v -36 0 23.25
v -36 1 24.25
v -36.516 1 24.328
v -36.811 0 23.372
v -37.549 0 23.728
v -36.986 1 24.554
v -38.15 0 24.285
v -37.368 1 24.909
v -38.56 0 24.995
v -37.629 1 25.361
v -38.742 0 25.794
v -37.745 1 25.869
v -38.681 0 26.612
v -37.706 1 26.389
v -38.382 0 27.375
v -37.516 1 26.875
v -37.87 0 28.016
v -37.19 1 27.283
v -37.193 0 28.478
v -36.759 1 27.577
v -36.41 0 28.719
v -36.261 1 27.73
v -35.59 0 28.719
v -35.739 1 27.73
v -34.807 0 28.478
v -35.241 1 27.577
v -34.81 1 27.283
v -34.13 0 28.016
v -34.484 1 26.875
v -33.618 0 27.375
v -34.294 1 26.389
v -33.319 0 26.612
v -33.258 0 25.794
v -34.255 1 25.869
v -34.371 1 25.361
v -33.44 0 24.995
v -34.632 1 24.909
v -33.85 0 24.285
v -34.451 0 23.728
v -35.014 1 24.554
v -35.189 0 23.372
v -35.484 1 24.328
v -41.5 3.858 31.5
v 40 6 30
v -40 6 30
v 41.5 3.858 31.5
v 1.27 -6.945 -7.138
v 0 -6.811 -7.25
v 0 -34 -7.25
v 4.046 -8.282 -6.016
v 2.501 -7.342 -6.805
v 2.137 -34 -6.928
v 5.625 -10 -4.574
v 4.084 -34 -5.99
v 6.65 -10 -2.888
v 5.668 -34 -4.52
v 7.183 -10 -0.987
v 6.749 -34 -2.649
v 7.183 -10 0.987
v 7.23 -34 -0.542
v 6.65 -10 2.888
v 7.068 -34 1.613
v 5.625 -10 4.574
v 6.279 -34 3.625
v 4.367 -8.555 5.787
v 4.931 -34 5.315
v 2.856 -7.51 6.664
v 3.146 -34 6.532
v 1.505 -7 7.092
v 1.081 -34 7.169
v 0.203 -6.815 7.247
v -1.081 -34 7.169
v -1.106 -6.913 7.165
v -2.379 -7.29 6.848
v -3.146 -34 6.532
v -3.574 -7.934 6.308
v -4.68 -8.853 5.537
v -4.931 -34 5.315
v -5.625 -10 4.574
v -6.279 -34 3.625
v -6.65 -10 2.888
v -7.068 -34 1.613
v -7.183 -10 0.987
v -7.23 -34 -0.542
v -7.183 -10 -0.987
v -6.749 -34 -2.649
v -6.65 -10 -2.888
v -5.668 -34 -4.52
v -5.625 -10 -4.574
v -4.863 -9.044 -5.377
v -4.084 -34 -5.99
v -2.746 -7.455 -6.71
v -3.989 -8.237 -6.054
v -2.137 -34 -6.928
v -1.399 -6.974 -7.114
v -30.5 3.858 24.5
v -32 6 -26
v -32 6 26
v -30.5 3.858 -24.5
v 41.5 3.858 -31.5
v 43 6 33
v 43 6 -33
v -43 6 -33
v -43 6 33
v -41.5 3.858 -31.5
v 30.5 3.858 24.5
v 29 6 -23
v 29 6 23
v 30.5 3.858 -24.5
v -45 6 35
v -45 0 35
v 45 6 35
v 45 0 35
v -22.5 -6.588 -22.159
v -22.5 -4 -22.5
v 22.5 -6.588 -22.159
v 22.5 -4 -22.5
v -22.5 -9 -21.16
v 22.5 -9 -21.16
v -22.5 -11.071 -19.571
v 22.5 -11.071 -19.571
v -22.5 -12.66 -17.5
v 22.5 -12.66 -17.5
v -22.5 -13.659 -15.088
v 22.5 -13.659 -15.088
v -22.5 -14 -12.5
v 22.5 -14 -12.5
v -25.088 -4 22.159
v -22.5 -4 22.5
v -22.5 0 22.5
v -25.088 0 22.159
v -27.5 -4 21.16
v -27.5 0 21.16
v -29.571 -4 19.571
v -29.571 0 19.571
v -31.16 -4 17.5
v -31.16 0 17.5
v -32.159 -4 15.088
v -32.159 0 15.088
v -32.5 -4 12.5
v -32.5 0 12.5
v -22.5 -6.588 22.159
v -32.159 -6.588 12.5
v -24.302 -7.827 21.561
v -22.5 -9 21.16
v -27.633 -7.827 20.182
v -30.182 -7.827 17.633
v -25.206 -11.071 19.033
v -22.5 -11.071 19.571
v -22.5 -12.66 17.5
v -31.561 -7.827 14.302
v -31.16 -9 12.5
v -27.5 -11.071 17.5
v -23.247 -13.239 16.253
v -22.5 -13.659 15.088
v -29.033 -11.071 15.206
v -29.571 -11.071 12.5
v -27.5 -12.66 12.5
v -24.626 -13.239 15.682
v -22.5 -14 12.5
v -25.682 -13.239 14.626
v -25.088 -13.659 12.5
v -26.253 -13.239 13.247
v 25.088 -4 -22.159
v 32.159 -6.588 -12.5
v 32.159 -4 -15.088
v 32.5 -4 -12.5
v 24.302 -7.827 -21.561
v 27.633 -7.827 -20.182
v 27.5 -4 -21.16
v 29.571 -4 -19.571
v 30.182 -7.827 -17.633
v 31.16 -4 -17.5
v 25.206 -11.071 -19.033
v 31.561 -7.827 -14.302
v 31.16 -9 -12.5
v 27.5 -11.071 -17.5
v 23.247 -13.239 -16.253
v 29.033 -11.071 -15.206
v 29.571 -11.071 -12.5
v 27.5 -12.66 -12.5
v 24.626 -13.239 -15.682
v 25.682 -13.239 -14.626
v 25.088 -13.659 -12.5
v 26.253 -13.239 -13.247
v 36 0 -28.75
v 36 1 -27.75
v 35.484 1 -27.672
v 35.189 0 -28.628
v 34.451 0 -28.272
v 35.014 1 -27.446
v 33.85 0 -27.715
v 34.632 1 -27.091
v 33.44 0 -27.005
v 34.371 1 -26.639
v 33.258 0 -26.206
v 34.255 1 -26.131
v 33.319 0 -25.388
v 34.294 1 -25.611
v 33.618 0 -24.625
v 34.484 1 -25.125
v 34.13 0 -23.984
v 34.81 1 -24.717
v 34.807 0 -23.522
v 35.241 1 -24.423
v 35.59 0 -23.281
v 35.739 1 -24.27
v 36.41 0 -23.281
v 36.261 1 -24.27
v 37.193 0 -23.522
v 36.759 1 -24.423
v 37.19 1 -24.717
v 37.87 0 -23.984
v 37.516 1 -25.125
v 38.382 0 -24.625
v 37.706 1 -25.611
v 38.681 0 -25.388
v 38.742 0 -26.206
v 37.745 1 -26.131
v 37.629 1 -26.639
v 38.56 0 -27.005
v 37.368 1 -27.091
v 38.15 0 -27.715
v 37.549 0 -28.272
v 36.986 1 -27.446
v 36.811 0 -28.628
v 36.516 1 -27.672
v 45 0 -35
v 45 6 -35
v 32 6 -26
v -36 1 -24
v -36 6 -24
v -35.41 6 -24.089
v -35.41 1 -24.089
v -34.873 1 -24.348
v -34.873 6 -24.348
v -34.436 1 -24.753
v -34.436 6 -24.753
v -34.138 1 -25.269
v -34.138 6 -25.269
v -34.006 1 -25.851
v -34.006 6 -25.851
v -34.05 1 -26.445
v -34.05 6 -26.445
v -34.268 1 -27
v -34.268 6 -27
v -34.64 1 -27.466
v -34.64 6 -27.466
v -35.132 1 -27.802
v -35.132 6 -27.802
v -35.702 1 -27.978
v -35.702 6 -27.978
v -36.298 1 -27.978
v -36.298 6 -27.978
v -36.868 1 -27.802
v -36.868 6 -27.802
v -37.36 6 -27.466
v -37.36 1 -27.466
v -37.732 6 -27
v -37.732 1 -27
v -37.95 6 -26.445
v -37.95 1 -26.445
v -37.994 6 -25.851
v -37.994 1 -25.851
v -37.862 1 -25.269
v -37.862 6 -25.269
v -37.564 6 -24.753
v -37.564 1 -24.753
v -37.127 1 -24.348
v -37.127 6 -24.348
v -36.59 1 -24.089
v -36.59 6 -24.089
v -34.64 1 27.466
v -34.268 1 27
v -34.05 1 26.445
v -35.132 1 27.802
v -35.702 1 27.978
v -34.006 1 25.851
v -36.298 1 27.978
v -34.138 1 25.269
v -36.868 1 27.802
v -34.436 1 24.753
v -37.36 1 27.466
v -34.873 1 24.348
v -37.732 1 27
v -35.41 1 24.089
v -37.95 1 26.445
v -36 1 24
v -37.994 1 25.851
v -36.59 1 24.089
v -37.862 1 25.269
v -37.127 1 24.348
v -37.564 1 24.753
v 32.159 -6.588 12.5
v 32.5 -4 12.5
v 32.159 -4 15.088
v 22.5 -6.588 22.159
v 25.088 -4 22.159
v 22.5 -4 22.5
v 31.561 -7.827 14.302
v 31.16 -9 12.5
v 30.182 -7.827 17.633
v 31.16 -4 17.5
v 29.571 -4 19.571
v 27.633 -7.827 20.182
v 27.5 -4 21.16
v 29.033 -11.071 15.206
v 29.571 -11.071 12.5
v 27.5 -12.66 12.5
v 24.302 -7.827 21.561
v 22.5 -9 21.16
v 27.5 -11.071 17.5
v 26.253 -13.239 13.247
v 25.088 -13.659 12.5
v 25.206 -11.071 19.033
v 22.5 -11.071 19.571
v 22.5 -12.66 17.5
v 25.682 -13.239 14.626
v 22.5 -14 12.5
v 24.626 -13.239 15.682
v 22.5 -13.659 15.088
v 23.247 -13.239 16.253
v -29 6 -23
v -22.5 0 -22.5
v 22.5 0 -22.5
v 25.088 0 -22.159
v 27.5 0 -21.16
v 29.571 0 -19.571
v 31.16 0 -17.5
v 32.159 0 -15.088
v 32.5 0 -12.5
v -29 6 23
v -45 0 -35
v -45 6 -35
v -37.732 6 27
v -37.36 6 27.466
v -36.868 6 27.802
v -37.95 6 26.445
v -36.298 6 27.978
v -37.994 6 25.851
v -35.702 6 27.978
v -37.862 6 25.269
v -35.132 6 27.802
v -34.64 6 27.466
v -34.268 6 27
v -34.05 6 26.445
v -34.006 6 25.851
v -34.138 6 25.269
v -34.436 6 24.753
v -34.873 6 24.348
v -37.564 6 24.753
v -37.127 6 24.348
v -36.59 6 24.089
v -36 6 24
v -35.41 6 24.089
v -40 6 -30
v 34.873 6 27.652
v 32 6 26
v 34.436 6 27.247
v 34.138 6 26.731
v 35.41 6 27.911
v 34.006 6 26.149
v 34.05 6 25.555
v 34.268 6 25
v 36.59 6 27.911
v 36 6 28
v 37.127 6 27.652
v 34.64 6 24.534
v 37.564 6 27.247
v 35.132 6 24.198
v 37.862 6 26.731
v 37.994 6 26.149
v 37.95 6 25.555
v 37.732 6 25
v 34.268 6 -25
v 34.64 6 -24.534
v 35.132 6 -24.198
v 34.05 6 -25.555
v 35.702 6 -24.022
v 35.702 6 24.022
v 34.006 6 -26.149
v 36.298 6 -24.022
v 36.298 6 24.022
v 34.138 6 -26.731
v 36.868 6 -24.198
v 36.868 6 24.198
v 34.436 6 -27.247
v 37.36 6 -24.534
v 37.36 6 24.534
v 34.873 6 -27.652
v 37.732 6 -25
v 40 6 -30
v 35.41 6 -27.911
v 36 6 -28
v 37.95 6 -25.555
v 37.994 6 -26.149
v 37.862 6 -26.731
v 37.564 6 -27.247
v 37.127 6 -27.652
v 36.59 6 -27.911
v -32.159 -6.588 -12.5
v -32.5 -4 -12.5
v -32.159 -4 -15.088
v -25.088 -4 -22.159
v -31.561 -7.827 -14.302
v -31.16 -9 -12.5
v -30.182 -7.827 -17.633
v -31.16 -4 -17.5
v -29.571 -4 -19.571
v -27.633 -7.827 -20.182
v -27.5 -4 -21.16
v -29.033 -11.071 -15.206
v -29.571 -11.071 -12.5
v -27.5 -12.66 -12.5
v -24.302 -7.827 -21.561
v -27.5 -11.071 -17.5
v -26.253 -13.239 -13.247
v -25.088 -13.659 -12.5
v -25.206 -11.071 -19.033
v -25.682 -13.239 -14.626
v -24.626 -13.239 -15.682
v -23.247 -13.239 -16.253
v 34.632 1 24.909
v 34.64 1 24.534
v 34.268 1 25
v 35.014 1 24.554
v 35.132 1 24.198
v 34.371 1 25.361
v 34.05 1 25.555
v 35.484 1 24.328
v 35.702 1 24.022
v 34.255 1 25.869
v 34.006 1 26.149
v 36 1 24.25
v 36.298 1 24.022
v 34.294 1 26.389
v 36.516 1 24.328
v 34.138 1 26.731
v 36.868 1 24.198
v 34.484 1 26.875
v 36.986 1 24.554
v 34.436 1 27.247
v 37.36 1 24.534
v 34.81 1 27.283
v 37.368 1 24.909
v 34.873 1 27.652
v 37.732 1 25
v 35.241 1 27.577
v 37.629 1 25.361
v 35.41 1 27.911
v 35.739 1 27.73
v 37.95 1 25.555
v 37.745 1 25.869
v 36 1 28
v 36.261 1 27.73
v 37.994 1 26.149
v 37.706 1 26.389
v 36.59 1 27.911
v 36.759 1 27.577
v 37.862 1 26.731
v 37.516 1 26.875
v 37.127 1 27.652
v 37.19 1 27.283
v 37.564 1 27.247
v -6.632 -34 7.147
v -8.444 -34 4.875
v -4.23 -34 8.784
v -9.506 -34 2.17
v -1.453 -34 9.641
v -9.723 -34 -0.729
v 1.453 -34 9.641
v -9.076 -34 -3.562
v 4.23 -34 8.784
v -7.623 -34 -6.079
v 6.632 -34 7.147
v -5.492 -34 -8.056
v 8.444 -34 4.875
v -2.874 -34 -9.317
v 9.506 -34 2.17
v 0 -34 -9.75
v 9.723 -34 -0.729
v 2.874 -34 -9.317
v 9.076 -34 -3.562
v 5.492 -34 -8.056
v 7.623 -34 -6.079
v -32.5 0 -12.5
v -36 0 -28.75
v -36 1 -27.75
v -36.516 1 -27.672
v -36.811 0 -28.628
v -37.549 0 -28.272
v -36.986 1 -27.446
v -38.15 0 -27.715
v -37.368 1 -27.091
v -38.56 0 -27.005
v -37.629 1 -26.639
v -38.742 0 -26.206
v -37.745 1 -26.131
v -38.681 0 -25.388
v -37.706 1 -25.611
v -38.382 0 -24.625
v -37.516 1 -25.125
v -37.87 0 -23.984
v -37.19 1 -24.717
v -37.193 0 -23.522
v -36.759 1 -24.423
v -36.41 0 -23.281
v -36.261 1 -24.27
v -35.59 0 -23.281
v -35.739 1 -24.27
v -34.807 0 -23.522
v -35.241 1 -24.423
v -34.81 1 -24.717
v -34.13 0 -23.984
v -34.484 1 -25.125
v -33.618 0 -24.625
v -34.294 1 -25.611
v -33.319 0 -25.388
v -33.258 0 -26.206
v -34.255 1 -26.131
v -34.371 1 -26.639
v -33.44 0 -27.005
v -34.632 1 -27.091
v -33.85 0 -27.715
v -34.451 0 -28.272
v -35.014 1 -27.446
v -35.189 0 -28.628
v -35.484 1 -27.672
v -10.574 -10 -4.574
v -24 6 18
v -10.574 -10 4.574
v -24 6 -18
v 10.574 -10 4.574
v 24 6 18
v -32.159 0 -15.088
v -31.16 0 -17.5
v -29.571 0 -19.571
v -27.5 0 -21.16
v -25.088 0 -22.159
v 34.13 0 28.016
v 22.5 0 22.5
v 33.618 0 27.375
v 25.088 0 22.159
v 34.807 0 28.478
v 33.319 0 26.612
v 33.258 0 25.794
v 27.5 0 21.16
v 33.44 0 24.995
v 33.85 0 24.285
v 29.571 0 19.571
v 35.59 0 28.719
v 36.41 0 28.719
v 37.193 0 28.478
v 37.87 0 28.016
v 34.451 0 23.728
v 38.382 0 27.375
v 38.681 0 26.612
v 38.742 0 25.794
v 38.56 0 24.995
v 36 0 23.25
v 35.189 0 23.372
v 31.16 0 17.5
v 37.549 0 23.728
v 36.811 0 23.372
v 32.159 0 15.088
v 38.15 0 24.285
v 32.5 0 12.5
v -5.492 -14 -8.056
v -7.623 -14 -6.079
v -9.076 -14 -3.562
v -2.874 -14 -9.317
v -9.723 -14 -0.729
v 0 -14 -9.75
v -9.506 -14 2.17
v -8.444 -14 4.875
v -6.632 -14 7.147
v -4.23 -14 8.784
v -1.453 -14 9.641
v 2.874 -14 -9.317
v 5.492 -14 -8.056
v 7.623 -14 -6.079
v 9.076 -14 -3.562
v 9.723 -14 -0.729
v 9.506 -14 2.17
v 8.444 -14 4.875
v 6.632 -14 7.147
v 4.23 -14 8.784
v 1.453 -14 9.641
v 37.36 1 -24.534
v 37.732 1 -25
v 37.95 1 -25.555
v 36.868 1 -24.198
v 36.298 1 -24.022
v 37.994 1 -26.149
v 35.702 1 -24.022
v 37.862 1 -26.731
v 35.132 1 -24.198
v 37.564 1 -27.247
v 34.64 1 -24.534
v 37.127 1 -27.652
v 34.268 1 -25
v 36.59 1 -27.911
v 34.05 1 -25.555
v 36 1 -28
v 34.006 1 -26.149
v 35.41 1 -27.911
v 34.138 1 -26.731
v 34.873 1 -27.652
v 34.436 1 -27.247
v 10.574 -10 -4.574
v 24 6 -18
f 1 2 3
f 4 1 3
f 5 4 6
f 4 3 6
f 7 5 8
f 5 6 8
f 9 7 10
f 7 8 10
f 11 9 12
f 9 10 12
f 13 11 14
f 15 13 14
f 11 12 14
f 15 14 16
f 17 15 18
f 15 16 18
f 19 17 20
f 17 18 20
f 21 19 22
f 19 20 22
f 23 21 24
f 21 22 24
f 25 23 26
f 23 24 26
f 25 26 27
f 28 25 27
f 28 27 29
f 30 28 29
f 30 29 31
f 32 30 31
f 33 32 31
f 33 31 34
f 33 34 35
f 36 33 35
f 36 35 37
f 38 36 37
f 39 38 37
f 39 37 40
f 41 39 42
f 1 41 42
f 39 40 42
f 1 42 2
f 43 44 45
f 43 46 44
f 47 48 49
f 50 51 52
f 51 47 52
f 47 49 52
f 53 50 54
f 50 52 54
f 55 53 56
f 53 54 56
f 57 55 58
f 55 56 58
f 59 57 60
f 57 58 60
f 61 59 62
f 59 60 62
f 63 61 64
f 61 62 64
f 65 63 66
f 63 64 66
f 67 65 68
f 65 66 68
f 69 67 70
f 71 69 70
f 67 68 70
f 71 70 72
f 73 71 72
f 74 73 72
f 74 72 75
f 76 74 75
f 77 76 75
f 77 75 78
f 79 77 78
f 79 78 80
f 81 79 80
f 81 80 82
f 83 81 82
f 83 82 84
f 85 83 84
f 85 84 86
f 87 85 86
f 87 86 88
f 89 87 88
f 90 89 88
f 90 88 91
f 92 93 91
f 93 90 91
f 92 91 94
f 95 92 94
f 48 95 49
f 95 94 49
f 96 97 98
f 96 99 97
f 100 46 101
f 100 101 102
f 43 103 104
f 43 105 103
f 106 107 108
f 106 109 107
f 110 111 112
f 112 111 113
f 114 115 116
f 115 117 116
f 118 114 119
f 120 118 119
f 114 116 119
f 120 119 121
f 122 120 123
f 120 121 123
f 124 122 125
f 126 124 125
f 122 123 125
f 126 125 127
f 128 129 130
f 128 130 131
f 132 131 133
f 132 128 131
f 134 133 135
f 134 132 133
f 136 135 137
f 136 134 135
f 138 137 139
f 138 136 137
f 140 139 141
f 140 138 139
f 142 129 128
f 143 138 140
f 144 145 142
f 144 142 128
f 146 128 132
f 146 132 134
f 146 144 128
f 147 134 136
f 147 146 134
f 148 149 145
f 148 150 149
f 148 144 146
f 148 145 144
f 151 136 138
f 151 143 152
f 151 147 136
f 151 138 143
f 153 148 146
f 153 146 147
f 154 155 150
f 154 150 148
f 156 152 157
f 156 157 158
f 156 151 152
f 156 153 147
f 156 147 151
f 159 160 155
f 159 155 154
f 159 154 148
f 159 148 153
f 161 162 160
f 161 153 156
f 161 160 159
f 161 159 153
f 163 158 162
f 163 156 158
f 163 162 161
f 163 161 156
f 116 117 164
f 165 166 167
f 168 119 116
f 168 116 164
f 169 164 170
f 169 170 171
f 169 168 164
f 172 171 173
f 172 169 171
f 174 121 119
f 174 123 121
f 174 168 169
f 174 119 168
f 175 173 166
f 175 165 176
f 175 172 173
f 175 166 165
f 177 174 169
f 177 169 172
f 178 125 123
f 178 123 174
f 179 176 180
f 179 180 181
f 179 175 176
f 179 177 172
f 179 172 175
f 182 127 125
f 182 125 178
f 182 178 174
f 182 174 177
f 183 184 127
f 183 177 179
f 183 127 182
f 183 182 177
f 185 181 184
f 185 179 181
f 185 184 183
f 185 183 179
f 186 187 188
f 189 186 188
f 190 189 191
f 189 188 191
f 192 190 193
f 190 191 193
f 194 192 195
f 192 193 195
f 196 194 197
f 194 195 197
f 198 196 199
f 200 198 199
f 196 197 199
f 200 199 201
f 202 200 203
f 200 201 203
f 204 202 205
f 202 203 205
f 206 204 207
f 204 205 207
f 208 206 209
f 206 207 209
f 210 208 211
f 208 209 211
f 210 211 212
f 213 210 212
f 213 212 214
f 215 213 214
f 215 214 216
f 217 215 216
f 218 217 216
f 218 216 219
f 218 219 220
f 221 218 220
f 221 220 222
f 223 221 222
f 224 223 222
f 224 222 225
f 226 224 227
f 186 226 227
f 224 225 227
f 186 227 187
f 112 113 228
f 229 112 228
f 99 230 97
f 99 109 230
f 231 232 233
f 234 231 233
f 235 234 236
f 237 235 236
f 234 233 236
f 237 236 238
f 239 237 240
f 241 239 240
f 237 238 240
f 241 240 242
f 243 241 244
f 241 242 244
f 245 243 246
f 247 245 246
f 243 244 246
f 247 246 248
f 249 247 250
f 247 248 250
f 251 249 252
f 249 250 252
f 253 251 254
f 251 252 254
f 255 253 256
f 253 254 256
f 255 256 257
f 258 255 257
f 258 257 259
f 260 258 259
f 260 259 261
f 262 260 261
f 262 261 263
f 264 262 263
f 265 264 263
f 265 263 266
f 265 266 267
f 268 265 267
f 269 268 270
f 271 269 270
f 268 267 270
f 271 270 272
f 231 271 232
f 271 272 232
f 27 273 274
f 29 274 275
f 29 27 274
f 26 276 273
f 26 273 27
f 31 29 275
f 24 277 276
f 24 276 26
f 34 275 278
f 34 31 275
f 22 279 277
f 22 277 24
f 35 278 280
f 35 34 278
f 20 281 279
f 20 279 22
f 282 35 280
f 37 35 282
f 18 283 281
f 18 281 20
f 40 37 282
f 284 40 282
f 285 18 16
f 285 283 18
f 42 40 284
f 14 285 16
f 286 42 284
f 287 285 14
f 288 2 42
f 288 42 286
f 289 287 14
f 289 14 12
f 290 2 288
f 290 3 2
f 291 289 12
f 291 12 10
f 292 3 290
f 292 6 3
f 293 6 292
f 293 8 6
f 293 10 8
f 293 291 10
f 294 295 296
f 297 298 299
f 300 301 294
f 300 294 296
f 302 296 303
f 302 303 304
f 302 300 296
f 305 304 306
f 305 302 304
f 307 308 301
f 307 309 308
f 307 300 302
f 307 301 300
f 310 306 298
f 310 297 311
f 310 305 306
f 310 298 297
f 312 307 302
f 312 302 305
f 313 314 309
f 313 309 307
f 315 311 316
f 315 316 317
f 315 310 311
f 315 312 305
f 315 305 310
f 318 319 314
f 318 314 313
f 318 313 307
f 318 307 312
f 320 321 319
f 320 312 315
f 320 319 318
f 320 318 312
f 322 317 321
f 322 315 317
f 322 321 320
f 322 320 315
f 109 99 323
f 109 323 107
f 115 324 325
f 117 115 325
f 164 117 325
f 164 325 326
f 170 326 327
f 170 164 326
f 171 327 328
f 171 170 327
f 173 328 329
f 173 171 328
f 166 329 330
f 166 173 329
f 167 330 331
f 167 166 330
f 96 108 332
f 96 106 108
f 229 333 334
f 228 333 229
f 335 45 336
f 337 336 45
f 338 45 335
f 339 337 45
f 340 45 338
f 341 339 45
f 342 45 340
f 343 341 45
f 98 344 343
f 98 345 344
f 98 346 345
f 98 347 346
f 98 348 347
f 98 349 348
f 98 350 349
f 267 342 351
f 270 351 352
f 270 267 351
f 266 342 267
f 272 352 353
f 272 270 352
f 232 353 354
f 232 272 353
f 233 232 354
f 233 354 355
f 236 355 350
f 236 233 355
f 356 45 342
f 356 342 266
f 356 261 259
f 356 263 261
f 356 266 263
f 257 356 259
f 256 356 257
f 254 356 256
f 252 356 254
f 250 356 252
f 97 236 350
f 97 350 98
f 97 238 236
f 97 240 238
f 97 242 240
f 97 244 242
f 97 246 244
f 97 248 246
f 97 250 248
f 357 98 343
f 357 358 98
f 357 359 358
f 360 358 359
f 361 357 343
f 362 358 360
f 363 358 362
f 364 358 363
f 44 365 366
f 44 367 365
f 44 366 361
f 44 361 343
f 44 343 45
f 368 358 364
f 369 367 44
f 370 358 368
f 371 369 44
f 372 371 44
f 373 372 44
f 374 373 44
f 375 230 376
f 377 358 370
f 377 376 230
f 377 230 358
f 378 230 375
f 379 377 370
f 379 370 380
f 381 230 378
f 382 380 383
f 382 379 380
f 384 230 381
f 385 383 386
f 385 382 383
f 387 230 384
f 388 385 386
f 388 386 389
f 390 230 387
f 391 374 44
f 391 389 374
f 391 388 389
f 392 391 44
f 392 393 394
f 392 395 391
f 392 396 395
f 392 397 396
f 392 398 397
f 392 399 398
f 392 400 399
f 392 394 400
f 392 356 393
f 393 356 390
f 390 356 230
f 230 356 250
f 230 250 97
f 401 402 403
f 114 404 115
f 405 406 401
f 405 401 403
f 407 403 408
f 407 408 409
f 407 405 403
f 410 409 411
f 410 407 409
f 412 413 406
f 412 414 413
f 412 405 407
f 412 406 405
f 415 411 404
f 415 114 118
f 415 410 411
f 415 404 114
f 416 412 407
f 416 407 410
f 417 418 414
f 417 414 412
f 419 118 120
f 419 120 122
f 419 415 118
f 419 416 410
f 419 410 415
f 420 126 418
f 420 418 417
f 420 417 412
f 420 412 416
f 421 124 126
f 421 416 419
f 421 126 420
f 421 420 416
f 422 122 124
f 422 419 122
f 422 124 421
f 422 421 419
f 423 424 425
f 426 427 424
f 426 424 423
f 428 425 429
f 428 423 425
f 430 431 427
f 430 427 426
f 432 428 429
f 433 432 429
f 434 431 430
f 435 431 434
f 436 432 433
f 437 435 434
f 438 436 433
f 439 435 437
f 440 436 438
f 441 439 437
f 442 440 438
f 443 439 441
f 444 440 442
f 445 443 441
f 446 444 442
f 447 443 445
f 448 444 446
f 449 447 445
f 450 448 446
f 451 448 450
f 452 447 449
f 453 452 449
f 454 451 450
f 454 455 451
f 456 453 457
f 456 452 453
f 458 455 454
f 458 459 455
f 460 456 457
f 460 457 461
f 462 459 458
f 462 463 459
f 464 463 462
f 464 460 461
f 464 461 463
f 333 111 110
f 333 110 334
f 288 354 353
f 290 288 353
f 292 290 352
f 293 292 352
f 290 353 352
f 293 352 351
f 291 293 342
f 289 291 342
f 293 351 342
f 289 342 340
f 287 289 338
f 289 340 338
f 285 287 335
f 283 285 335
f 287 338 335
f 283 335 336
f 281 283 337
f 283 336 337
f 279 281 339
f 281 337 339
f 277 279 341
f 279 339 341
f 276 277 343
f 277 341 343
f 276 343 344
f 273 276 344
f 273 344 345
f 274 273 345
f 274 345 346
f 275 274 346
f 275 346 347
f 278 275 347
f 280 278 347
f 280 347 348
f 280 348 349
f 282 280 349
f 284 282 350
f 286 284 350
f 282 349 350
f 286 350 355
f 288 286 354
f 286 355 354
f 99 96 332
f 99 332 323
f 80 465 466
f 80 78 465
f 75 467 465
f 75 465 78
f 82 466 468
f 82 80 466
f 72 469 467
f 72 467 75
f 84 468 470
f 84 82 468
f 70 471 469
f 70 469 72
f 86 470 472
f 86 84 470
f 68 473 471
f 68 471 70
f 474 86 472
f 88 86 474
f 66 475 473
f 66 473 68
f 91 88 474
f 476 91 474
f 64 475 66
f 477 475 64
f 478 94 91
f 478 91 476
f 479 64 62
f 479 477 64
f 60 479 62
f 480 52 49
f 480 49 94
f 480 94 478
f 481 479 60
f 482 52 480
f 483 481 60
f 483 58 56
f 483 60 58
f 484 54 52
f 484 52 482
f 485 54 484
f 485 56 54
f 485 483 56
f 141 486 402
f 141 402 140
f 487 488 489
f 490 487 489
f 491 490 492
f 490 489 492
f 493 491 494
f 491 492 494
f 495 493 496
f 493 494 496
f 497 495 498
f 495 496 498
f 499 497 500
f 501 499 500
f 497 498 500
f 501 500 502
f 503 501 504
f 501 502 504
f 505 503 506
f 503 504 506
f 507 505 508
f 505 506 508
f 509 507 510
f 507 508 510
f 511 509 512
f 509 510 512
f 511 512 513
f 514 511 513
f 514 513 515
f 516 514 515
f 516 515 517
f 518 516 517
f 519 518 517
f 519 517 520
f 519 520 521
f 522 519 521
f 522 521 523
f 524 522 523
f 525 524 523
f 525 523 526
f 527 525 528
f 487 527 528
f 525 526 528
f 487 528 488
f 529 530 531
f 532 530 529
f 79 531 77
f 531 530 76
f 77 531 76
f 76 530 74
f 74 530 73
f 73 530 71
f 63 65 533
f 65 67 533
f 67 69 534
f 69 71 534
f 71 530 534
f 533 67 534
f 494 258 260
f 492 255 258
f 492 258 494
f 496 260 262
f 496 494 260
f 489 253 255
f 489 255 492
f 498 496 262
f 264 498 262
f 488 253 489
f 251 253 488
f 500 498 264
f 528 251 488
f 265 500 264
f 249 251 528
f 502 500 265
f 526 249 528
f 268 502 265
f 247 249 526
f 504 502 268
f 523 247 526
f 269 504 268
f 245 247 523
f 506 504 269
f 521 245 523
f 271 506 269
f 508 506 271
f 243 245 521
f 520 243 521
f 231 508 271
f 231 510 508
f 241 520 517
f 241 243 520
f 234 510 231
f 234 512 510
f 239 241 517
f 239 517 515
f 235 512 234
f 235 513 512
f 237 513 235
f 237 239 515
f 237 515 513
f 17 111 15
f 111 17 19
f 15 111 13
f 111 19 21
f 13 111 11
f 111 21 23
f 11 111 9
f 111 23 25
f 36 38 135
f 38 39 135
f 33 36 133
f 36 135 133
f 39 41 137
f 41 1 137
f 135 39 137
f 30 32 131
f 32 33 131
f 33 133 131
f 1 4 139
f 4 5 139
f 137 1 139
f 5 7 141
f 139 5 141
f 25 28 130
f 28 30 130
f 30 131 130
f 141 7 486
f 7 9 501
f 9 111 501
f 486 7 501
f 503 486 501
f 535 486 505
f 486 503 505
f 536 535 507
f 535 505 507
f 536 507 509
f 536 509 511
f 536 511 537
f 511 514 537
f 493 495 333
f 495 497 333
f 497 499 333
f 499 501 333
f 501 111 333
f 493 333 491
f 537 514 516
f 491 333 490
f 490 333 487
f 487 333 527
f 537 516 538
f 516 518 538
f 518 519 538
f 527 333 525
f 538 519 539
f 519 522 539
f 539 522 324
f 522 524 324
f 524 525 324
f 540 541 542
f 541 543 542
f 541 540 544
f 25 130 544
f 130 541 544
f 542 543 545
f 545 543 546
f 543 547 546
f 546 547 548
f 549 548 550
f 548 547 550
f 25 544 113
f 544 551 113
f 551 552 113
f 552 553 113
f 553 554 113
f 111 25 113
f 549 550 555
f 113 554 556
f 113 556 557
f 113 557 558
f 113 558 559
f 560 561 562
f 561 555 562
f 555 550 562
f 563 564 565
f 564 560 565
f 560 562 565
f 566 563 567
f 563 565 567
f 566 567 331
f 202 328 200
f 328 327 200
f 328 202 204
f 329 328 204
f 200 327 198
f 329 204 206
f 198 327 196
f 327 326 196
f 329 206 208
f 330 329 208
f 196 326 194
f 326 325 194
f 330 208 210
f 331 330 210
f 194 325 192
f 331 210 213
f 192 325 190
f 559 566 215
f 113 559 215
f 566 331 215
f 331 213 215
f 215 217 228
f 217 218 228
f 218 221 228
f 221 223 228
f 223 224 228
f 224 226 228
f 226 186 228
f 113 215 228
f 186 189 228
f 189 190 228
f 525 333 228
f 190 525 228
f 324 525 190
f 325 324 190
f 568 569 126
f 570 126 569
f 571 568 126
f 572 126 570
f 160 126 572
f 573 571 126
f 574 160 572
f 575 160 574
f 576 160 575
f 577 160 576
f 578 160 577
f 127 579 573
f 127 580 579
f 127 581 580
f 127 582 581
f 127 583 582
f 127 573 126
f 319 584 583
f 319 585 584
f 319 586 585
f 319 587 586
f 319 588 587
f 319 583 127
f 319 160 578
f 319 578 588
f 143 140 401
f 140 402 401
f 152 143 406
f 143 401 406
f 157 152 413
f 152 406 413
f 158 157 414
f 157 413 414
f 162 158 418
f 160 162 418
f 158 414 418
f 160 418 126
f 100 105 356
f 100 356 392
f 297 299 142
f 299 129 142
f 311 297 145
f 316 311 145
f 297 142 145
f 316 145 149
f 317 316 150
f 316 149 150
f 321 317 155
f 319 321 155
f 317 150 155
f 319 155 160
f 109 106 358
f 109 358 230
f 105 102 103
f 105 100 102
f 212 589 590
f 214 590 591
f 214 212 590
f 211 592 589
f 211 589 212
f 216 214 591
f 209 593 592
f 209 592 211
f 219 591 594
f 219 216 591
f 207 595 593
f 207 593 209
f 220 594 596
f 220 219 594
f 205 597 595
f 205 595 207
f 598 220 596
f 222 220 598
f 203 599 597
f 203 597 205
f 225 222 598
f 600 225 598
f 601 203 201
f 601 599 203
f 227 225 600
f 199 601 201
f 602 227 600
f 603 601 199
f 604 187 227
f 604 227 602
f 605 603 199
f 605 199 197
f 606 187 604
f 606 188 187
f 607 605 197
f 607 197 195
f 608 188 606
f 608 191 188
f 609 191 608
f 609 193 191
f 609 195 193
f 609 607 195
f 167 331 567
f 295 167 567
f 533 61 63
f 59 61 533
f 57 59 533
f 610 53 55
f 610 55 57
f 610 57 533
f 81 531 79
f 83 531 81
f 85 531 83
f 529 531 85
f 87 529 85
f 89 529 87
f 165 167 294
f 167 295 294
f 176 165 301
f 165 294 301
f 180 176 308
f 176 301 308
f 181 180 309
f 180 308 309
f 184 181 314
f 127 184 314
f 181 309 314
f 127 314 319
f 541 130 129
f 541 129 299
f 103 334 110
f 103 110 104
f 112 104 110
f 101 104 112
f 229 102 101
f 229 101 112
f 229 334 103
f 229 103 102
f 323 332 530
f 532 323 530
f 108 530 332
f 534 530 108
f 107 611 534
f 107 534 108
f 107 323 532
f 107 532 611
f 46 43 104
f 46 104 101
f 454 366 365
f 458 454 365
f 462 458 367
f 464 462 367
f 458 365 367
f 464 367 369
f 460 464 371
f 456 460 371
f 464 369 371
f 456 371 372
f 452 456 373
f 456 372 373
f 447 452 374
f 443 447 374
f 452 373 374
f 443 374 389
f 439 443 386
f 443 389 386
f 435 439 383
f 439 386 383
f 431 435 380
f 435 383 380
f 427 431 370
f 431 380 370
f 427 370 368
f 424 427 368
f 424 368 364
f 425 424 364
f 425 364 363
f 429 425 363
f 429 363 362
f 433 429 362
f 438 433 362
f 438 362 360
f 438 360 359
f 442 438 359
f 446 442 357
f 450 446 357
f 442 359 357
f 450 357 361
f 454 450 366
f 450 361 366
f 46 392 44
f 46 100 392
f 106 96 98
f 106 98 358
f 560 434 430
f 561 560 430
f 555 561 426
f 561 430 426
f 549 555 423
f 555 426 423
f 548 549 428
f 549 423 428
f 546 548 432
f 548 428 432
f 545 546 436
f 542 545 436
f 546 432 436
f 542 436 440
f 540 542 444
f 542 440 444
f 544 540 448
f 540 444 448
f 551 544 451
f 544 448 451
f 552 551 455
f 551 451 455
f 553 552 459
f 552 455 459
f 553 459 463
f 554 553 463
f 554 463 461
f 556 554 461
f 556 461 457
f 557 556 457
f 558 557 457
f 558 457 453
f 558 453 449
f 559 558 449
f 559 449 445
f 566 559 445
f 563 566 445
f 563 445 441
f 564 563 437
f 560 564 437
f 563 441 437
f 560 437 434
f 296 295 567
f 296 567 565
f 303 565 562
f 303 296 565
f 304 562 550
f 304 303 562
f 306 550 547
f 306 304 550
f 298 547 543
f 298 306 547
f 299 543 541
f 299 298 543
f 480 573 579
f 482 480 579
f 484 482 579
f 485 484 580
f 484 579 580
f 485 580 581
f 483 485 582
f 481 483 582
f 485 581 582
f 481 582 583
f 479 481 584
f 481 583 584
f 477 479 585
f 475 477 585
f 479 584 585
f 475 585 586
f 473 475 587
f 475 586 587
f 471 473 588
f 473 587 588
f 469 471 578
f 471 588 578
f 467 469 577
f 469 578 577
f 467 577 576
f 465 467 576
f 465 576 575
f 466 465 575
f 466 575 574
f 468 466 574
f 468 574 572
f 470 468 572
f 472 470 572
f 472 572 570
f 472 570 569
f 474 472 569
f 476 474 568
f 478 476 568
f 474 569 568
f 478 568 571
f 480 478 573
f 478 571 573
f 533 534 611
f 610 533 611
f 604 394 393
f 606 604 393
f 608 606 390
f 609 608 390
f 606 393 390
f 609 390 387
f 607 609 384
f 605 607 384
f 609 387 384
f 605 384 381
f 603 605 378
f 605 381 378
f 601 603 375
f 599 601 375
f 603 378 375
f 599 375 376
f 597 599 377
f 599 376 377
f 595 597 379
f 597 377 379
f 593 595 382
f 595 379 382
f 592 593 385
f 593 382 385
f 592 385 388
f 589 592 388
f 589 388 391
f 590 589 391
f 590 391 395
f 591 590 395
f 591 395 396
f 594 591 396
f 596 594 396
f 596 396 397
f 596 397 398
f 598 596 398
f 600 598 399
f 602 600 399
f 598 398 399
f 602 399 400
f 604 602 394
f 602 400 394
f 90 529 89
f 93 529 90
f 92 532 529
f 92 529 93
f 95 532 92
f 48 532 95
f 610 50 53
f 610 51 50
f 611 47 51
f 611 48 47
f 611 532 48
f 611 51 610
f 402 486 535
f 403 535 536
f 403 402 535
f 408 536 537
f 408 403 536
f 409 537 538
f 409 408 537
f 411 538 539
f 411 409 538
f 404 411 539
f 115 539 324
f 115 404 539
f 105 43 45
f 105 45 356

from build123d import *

# Parameters (mm, degrees)
SKETCH1_W               = 90
SKETCH1_H               = 70
BASE_PLATE_DEPTH        = 6
SKETCH4_W               = 86
SKETCH4_H               = 66
SKETCH4_W_2             = 80
SKETCH4_H_2             = 60
SEALANT_CUT_OUTER_DEPTH = 5
SEALANT_CUT_OUTER_TAPER = 35
SKETCH7_R               = 2
SCRE_CUT_DEPTH          = 5
SKETCH12_W              = 64
SKETCH12_H              = 52
SKETCH12_W_2            = 58
SKETCH12_H_2            = 46
SEALANT_CUT_INNER_DEPTH = 3
SEALANT_CUT_INNER_TAPER = 35
SKETCH14_W              = 65
SKETCH14_H              = 45
BASE_BLOCK_DEPTH        = 14
SKETCH13_W              = 48
SKETCH13_H              = 36
DRAIN_DEPTH             = 16
DRAIN_DRAFT             = -40
SKETCH15_R              = 9.75
HOSE_CONNECTOR_DEPTH    = 20
SKETCH16_R              = 7.25
DRAIN_HOLE_DEPTH        = 70.641941443
FILLET1_R               = 10
FILLET2_R               = 10
FILLET3_R               = 10
FILLET4_R               = 10
FILLET5_R               = 10


with BuildPart() as part:
    # Sketch1 → Base Plate (new body)
    with BuildSketch(Plane(origin=(0, 0, 0), x_dir=(1, 0, 0), z_dir=(0, 1, 0))):
        Rectangle(SKETCH1_W, SKETCH1_H)
    extrude(amount=BASE_PLATE_DEPTH)

    # Sketch4 → Sealant Cut - Outer (cut)
    with BuildSketch(Plane(origin=(0, 6, 0), x_dir=(1, 0, 0), z_dir=(0, 1, 0))):
        Rectangle(SKETCH4_W, SKETCH4_H)
        Rectangle(SKETCH4_W_2, SKETCH4_H_2, mode=Mode.SUBTRACT)
    extrude(amount=-SEALANT_CUT_OUTER_DEPTH, taper=SEALANT_CUT_OUTER_TAPER, mode=Mode.SUBTRACT)

    # Sketch7 → Scre Cut (cut)
    with BuildSketch(Plane(origin=(0, 6, 0), x_dir=(1, 0, 0), z_dir=(0, 1, 0))):
        with Locations(Location((-36, 26, 0), (0, 0, 270))):
            Circle(SKETCH7_R)
        with Locations(Location((-36, -26, 0), (0, 0, 90))):
            Circle(SKETCH7_R)
        with Locations(Location((36, -26, 0), (0, 0, 270))):
            Circle(SKETCH7_R)
        with Locations(Location((36, 26, 0), (0, 0, 90))):
            Circle(SKETCH7_R)
    extrude(amount=-SCRE_CUT_DEPTH, mode=Mode.SUBTRACT)

    # Sketch12 → Sealant Cut - Inner (cut)
    with BuildSketch(Plane(origin=(0, 6, 0), x_dir=(1, 0, 0), z_dir=(0, 1, 0))):
        Rectangle(SKETCH12_W, SKETCH12_H)
        Rectangle(SKETCH12_W_2, SKETCH12_H_2, mode=Mode.SUBTRACT)
    extrude(amount=-SEALANT_CUT_INNER_DEPTH, taper=SEALANT_CUT_INNER_TAPER, mode=Mode.SUBTRACT)

    # Sketch14 → Base Block (add)
    with BuildSketch(Plane.XZ):
        Rectangle(SKETCH14_W, SKETCH14_H)
    extrude(amount=BASE_BLOCK_DEPTH)


with BuildPart() as drain_tool:
    # Sketch13 → Drain (with draft: the straight prism first)
    with BuildSketch(Plane(origin=(0, 6, 0), x_dir=(1, 0, 0), z_dir=(0, 1, 0))):
        Rectangle(SKETCH13_W, SKETCH13_H)
    extrude(amount=-DRAIN_DEPTH)
    # Drain: the draft: its side faces are tilted about the plane it starts from
    drain_sides = [drain_tool.faces().sort_by_distance(p)[0] for p in [
        (-24, -2, 0),
        (0, -2, 18),
        (24, -2, 0),
        (0, -2, -18),
    ]]
    draft(drain_sides, Plane(origin=(0, 6, 0), x_dir=(1, 0, 0), z_dir=(0, 1, 0)), DRAIN_DRAFT)


with BuildPart() as part_1:
    add(part.part)

    # Drain: cut by drain_tool
    add(drain_tool.part, mode=Mode.SUBTRACT)

    # Sketch15 → Hose connector (add)
    with BuildSketch(Plane.XZ.offset(14)):
        with Locations(Location((0, 0, 0), (0, 0, 270))):
            Circle(SKETCH15_R)
    extrude(amount=HOSE_CONNECTOR_DEPTH)

    # Sketch16 → Drain Hole (cut, through all)
    with BuildSketch(Plane.XZ.offset(34)):
        with Locations(Location((0, 0, 0), (0, 0, 270))):
            Circle(SKETCH16_R)
    extrude(amount=-DRAIN_HOLE_DEPTH, mode=Mode.SUBTRACT)

    # Fillet1
    fillet1_edges = [part_1.edges().sort_by_distance(p)[0] for p in [
        (-32.5, -7, -22.5),
    ]]
    fillet(fillet1_edges, radius=FILLET1_R)

    # Fillet2
    fillet2_edges = [part_1.edges().sort_by_distance(p)[0] for p in [
        (32.5, -7, -22.5),
    ]]
    fillet(fillet2_edges, radius=FILLET2_R)

    # Fillet3
    fillet3_edges = [part_1.edges().sort_by_distance(p)[0] for p in [
        (32.5, -7, 22.5),
    ]]
    fillet(fillet3_edges, radius=FILLET3_R)

    # Fillet4
    fillet4_edges = [part_1.edges().sort_by_distance(p)[0] for p in [
        (-32.5, -7, 22.5),
    ]]
    fillet(fillet4_edges, radius=FILLET4_R)

    # Srew Heads cone 1 section (through the dimple's axis) → Srew Heads (revolve, cut)
    with BuildSketch(Plane(origin=(-36, 0, -26), x_dir=(0, 0, -1), z_dir=(1, 0, 0))):
        Polygon((0, 0), (2.75, 0), (0, 2.75), align=None)
    revolve(axis=Axis((-36, 0, -26), (0, 1, 0)), mode=Mode.SUBTRACT)

    # Srew Heads cone 2 section (through the dimple's axis) → Srew Heads cone 2 (revolve, cut)
    with BuildSketch(Plane(origin=(-36, 0, 26), x_dir=(0, 0, -1), z_dir=(1, 0, 0))):
        Polygon((0, 0), (2.75, 0), (0, 2.75), align=None)
    revolve(axis=Axis((-36, 0, 26), (0, 1, 0)), mode=Mode.SUBTRACT)

    # Srew Heads cone 3 section (through the dimple's axis) → Srew Heads cone 3 (revolve, cut)
    with BuildSketch(Plane(origin=(36, 0, 26), x_dir=(0, 0, -1), z_dir=(1, 0, 0))):
        Polygon((0, 0), (2.75, 0), (0, 2.75), align=None)
    revolve(axis=Axis((36, 0, 26), (0, 1, 0)), mode=Mode.SUBTRACT)

    # Srew Heads cone 4 section (through the dimple's axis) → Srew Heads cone 4 (revolve, cut)
    with BuildSketch(Plane(origin=(36, 0, -26), x_dir=(0, 0, -1), z_dir=(1, 0, 0))):
        Polygon((0, 0), (2.75, 0), (0, 2.75), align=None)
    revolve(axis=Axis((36, 0, -26), (0, 1, 0)), mode=Mode.SUBTRACT)

    # Fillet5
    fillet5_edges = [part_1.edges().sort_by_distance(p)[0] for p in [
        (0, -14, -22.5),
        (-29.571067812, -14, -19.571067812),
        (32.5, -14, 0),
        (29.571067812, -14, -19.571067812),
        (0, -14, 22.5),
        (29.571067812, -14, 19.571067812),
        (-32.5, -14, 0),
        (-29.571067812, -14, 19.571067812),
    ]]
    fillet(fillet5_edges, radius=FILLET5_R)


solid = part_1.part
